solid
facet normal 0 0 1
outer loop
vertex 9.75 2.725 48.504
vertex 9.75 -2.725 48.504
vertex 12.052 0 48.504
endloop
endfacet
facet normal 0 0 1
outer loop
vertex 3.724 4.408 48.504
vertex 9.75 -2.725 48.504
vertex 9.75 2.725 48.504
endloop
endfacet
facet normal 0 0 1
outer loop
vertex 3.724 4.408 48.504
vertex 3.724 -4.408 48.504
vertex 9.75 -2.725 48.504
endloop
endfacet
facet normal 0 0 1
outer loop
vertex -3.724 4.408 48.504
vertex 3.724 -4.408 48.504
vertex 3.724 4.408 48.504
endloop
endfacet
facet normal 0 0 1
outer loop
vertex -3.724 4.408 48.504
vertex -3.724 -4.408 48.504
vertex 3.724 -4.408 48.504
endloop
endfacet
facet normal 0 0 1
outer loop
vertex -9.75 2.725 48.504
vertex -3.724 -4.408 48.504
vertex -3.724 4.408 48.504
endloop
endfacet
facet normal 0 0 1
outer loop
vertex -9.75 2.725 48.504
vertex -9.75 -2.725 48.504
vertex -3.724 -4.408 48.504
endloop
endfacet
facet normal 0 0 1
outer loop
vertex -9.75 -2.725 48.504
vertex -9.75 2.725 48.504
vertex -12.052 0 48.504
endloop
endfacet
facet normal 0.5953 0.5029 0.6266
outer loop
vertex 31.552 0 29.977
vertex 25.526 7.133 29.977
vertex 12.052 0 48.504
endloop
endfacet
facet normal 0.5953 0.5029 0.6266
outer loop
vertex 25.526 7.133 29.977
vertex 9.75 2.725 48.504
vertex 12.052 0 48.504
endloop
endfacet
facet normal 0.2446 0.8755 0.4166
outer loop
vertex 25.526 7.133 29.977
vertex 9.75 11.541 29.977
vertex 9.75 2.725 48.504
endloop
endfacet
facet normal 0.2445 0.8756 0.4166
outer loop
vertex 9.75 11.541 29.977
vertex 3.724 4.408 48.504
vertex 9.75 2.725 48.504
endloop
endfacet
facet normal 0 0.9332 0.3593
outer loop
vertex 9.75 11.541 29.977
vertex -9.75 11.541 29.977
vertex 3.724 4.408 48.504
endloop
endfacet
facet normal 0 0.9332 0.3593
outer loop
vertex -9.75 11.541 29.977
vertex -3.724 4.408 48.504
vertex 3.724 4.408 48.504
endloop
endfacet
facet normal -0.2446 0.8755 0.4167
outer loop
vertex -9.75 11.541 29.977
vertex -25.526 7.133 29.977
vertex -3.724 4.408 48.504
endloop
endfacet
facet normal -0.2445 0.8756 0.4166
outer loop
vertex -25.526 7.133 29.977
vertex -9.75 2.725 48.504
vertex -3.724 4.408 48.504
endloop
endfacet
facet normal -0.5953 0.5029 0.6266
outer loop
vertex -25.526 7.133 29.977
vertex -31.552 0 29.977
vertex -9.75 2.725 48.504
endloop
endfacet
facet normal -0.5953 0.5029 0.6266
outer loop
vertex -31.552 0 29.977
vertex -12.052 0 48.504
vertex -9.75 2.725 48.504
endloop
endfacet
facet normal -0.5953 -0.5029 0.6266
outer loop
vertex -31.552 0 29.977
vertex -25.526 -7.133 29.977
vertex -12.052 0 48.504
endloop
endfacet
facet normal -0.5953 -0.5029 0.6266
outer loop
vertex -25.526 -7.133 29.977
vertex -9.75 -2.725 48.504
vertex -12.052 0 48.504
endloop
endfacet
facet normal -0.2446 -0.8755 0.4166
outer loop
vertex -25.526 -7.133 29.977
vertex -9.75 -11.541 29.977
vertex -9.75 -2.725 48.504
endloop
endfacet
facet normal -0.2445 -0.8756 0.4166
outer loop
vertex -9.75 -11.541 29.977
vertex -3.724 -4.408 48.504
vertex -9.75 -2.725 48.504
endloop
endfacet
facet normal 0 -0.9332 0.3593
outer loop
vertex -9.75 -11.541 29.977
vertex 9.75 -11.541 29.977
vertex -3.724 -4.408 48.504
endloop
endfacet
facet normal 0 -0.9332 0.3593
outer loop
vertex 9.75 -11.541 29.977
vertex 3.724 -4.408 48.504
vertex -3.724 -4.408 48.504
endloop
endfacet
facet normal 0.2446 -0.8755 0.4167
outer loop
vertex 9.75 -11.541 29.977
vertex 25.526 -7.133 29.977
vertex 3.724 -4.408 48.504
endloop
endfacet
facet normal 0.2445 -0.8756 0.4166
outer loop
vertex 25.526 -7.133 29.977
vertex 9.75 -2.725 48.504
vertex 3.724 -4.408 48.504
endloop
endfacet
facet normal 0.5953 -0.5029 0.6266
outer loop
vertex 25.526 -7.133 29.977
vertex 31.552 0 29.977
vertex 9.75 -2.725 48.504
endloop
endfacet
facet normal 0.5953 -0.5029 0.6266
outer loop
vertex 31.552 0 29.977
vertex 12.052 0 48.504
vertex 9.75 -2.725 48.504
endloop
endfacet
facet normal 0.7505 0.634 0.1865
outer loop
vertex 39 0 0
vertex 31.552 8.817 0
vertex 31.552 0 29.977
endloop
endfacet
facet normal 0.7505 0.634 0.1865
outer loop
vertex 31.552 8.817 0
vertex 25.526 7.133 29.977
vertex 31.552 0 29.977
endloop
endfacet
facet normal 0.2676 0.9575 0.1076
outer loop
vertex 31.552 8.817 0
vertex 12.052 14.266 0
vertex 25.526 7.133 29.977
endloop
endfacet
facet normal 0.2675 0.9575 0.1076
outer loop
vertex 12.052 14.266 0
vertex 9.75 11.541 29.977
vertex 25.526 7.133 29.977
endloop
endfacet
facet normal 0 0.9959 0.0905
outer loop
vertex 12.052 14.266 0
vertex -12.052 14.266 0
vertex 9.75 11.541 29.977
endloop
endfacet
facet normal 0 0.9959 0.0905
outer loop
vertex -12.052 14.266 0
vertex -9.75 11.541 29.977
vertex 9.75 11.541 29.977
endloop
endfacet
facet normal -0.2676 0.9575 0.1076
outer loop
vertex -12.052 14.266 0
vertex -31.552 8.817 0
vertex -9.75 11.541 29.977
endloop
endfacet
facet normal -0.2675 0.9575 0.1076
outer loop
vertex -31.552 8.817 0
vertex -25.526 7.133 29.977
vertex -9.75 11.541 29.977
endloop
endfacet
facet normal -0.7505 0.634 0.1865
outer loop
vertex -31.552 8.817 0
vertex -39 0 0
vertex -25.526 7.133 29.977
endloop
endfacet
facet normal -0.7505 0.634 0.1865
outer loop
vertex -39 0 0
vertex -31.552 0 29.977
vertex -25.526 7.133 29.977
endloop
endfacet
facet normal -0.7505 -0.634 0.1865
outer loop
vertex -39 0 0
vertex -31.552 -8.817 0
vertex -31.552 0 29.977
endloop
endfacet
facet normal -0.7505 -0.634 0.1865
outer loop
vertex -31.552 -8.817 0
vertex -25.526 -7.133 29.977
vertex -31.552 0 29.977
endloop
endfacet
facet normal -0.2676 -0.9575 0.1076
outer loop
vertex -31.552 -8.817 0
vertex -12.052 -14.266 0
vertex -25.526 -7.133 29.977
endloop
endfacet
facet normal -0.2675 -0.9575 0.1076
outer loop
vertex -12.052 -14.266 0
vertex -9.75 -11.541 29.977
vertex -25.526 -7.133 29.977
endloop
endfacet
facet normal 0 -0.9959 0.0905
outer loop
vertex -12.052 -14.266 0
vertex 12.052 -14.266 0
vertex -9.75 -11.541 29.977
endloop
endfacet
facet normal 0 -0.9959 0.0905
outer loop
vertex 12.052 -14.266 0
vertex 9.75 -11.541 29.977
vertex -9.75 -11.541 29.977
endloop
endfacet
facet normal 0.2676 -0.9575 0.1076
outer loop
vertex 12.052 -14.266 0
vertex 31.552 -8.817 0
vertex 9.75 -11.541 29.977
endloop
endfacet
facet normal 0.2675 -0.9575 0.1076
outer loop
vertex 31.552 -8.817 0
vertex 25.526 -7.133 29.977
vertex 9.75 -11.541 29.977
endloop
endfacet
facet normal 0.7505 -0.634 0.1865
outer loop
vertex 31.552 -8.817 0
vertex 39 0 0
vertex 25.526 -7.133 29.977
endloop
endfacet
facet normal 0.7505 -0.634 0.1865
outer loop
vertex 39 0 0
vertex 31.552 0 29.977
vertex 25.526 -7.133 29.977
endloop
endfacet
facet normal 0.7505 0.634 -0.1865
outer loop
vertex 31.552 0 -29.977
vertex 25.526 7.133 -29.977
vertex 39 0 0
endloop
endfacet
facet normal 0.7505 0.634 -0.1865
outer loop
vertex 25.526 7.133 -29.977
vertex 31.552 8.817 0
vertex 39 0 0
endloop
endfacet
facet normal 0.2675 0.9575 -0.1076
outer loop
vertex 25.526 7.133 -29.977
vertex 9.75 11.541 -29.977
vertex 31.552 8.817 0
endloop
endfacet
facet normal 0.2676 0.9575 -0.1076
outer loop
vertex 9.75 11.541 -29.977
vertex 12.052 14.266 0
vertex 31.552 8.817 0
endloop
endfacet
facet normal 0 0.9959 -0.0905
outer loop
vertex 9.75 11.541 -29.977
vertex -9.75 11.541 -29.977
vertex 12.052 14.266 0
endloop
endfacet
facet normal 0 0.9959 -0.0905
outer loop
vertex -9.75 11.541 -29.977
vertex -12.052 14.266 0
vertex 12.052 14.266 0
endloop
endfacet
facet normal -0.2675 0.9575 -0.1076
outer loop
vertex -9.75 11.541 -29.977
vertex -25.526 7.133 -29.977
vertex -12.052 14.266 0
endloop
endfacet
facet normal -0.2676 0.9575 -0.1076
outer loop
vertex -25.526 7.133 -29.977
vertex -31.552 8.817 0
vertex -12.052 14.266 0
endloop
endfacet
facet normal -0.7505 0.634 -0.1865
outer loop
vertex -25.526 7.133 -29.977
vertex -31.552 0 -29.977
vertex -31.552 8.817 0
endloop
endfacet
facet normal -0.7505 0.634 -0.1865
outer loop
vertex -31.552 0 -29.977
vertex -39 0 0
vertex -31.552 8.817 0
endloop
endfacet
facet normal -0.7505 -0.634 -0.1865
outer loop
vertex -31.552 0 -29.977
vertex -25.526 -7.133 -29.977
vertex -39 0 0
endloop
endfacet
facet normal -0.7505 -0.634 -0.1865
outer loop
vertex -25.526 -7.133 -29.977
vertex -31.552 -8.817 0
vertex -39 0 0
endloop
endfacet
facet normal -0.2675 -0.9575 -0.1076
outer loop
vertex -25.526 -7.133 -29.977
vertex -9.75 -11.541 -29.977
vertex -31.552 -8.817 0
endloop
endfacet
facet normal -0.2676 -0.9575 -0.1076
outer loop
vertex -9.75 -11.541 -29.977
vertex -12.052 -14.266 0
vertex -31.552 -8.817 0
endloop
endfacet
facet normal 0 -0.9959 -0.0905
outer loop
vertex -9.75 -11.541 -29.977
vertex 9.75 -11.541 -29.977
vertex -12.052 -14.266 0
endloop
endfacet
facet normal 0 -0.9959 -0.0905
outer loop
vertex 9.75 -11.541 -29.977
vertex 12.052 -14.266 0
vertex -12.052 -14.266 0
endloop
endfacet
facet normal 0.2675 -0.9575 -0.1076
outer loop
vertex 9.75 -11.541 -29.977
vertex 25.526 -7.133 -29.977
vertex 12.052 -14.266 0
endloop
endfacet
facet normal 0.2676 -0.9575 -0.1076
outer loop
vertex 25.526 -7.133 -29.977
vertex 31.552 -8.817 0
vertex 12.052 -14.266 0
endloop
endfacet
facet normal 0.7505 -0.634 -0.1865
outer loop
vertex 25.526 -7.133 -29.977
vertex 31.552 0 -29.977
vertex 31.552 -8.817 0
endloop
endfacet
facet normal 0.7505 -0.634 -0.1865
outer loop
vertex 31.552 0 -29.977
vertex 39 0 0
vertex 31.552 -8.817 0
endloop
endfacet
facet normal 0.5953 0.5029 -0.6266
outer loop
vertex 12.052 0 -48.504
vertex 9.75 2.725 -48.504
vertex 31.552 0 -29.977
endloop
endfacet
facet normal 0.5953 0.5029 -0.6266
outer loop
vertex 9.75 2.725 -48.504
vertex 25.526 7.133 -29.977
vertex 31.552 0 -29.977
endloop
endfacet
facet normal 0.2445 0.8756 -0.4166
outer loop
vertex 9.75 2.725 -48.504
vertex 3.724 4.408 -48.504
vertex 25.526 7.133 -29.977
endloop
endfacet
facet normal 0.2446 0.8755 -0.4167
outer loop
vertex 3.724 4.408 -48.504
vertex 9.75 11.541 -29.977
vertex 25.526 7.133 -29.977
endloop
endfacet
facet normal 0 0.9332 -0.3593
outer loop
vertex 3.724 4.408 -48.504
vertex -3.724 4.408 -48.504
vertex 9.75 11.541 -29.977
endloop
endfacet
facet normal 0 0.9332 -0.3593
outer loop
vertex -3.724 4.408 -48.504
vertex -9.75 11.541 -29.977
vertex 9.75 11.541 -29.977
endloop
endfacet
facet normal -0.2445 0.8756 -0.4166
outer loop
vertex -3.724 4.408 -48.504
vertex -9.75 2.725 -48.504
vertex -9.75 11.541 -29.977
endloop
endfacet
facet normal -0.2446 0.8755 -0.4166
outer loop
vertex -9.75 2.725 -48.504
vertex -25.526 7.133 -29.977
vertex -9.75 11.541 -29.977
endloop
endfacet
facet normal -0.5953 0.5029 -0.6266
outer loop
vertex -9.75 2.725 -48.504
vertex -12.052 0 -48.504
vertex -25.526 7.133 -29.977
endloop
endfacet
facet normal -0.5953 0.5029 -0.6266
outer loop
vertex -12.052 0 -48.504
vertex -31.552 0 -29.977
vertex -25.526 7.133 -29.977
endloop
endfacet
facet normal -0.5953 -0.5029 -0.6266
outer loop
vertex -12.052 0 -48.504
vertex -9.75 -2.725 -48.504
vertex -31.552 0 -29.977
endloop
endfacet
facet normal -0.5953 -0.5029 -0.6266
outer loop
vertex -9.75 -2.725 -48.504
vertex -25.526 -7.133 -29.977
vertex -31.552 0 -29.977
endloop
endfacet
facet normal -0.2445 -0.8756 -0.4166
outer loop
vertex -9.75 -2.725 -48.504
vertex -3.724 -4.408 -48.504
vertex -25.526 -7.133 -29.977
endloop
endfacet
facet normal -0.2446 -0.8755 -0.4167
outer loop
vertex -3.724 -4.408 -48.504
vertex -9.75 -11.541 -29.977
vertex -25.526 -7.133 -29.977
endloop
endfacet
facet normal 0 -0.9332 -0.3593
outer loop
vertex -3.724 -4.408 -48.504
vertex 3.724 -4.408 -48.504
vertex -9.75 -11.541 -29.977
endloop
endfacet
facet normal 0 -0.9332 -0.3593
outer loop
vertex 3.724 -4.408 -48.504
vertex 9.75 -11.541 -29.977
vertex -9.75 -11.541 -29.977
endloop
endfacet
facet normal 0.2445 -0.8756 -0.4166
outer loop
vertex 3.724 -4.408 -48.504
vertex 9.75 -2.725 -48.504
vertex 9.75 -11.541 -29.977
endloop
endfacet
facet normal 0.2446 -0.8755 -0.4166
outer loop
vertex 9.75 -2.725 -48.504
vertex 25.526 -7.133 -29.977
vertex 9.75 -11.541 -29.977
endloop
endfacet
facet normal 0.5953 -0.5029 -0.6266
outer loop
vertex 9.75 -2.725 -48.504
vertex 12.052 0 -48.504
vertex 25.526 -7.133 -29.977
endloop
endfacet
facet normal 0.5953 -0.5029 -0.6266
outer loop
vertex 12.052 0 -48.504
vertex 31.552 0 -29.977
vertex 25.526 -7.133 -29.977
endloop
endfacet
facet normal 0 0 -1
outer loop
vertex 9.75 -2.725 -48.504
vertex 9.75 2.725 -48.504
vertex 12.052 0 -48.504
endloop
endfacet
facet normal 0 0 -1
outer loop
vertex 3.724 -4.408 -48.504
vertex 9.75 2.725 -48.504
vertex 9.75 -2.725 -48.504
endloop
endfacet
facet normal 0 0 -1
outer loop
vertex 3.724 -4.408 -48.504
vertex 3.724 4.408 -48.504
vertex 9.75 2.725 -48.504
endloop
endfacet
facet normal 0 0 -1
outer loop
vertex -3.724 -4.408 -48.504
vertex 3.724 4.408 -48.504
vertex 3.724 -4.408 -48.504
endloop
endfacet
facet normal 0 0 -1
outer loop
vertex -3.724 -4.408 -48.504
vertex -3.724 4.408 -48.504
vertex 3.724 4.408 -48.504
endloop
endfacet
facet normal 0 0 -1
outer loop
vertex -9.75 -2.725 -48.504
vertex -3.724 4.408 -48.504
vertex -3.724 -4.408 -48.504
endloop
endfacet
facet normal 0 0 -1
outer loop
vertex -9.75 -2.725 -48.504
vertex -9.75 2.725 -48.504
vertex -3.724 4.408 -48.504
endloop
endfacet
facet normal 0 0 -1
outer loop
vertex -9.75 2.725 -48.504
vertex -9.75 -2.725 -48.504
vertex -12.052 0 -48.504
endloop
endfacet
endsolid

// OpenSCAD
// Generated by SolidPython 1.0.1 on 2020-07-29 00:46:50


scale(v = [13, 5, 17]) {
	sphere(r = 3);
}
/***********************************************
*********      SolidPython code:      **********
************************************************
 
# import packages: SolidPython
from solid import *
from solid.utils import *
from itertools import chain, combinations, permutations


class Resize:

    def __init__(self, scad_file):
        self.scad_file = scad_file
        #self.scad_file = import_scad(scad_file)
        # cone/cylinder param:
        self.r1 = 0
        self.r2 = 0
        self.h = 0
        # rectangular prism param:
        self.w = 0
        self.l = 0
        # ellipse param:
        self.r = 0

    # import OpenScad code (file name corresponds to shape)


    # classify shape + parameters
    def assign(self, param1, param2, param3):
        if self.scad_file == 'cone.scad':
            self.r1 = param1
            self.r2 = param2
            self.h = param3
        elif self.scad_file == 'cylinder.scad':
            self.r1 = param1
            self.r2 = param2
            self.h = param3
        elif self.scad_file == 'rectangularPrism.scad':
            self.h = param1
            self.l = param2
            self.w = param3
        else:
            self.r = param1
            self.h = param2

    # resize parameters
    def iterate(self):
        x = range(3, 20, 2)
        i = 1
        if self.scad_file == 'cone.scad':
            tempList = list(permutations(x, 2))
            for temp in tempList:
                param1 = temp[0]
                param2 = temp[1]
                filepath = 'produced_scad_files/' + 'cone' + str(param1) + '_' + str(param2) + '_' + '.scad'
                scad_render_to_file(cylinder(h=param1, r1=param2, r2=0), filepath)

        elif self.scad_file == 'cylinder.scad':
            tempList = list(permutations(x, 3))
            for temp in tempList:
                param1 = temp[0]
                param2 = temp[1]
                filepath = 'produced_scad_files/' + 'cylinder' + str(param1) + '_' + str(param2) + '_' + '.scad'
                scad_render_to_file(cylinder(h=param1, r1=param2, r2=param2), filepath)

        elif self.scad_file == 'rectangularPrism.scad':
            tempList = list(permutations(x, 3))
            for temp in tempList:
                param1 = temp[0]
                param2 = temp[1]
                param3 = temp[2]
                filepath = 'produced_scad_files/' + 'rectangularPrism' + str(param1) + '_' + str(param2) + '_' + str(
                    param3) + '.scad'
                scad_render_to_file(cube(size=(param1, param2, param3)), filepath)

        elif self.scad_file == 'ellipse.scad':
            tempList = list(permutations(x, 4))
            for temp in tempList:
                param1 = temp[0]
                param2 = temp[1]
                param3 = temp[2]
                param4 = temp[3]
                filepath = 'produced_scad_files/' + 'ellipse' + str(param1) + '_' + str(param2) + '_' + str(param3) + '_' + str(param4) + '.scad'
                scad_render_to_file(scale([param1, param2, param3])(sphere(r=param4)), filepath)

    def render_to_scadfile(self):
        scad_render_to_file(scad, 'example.scad') 
 
************************************************/
